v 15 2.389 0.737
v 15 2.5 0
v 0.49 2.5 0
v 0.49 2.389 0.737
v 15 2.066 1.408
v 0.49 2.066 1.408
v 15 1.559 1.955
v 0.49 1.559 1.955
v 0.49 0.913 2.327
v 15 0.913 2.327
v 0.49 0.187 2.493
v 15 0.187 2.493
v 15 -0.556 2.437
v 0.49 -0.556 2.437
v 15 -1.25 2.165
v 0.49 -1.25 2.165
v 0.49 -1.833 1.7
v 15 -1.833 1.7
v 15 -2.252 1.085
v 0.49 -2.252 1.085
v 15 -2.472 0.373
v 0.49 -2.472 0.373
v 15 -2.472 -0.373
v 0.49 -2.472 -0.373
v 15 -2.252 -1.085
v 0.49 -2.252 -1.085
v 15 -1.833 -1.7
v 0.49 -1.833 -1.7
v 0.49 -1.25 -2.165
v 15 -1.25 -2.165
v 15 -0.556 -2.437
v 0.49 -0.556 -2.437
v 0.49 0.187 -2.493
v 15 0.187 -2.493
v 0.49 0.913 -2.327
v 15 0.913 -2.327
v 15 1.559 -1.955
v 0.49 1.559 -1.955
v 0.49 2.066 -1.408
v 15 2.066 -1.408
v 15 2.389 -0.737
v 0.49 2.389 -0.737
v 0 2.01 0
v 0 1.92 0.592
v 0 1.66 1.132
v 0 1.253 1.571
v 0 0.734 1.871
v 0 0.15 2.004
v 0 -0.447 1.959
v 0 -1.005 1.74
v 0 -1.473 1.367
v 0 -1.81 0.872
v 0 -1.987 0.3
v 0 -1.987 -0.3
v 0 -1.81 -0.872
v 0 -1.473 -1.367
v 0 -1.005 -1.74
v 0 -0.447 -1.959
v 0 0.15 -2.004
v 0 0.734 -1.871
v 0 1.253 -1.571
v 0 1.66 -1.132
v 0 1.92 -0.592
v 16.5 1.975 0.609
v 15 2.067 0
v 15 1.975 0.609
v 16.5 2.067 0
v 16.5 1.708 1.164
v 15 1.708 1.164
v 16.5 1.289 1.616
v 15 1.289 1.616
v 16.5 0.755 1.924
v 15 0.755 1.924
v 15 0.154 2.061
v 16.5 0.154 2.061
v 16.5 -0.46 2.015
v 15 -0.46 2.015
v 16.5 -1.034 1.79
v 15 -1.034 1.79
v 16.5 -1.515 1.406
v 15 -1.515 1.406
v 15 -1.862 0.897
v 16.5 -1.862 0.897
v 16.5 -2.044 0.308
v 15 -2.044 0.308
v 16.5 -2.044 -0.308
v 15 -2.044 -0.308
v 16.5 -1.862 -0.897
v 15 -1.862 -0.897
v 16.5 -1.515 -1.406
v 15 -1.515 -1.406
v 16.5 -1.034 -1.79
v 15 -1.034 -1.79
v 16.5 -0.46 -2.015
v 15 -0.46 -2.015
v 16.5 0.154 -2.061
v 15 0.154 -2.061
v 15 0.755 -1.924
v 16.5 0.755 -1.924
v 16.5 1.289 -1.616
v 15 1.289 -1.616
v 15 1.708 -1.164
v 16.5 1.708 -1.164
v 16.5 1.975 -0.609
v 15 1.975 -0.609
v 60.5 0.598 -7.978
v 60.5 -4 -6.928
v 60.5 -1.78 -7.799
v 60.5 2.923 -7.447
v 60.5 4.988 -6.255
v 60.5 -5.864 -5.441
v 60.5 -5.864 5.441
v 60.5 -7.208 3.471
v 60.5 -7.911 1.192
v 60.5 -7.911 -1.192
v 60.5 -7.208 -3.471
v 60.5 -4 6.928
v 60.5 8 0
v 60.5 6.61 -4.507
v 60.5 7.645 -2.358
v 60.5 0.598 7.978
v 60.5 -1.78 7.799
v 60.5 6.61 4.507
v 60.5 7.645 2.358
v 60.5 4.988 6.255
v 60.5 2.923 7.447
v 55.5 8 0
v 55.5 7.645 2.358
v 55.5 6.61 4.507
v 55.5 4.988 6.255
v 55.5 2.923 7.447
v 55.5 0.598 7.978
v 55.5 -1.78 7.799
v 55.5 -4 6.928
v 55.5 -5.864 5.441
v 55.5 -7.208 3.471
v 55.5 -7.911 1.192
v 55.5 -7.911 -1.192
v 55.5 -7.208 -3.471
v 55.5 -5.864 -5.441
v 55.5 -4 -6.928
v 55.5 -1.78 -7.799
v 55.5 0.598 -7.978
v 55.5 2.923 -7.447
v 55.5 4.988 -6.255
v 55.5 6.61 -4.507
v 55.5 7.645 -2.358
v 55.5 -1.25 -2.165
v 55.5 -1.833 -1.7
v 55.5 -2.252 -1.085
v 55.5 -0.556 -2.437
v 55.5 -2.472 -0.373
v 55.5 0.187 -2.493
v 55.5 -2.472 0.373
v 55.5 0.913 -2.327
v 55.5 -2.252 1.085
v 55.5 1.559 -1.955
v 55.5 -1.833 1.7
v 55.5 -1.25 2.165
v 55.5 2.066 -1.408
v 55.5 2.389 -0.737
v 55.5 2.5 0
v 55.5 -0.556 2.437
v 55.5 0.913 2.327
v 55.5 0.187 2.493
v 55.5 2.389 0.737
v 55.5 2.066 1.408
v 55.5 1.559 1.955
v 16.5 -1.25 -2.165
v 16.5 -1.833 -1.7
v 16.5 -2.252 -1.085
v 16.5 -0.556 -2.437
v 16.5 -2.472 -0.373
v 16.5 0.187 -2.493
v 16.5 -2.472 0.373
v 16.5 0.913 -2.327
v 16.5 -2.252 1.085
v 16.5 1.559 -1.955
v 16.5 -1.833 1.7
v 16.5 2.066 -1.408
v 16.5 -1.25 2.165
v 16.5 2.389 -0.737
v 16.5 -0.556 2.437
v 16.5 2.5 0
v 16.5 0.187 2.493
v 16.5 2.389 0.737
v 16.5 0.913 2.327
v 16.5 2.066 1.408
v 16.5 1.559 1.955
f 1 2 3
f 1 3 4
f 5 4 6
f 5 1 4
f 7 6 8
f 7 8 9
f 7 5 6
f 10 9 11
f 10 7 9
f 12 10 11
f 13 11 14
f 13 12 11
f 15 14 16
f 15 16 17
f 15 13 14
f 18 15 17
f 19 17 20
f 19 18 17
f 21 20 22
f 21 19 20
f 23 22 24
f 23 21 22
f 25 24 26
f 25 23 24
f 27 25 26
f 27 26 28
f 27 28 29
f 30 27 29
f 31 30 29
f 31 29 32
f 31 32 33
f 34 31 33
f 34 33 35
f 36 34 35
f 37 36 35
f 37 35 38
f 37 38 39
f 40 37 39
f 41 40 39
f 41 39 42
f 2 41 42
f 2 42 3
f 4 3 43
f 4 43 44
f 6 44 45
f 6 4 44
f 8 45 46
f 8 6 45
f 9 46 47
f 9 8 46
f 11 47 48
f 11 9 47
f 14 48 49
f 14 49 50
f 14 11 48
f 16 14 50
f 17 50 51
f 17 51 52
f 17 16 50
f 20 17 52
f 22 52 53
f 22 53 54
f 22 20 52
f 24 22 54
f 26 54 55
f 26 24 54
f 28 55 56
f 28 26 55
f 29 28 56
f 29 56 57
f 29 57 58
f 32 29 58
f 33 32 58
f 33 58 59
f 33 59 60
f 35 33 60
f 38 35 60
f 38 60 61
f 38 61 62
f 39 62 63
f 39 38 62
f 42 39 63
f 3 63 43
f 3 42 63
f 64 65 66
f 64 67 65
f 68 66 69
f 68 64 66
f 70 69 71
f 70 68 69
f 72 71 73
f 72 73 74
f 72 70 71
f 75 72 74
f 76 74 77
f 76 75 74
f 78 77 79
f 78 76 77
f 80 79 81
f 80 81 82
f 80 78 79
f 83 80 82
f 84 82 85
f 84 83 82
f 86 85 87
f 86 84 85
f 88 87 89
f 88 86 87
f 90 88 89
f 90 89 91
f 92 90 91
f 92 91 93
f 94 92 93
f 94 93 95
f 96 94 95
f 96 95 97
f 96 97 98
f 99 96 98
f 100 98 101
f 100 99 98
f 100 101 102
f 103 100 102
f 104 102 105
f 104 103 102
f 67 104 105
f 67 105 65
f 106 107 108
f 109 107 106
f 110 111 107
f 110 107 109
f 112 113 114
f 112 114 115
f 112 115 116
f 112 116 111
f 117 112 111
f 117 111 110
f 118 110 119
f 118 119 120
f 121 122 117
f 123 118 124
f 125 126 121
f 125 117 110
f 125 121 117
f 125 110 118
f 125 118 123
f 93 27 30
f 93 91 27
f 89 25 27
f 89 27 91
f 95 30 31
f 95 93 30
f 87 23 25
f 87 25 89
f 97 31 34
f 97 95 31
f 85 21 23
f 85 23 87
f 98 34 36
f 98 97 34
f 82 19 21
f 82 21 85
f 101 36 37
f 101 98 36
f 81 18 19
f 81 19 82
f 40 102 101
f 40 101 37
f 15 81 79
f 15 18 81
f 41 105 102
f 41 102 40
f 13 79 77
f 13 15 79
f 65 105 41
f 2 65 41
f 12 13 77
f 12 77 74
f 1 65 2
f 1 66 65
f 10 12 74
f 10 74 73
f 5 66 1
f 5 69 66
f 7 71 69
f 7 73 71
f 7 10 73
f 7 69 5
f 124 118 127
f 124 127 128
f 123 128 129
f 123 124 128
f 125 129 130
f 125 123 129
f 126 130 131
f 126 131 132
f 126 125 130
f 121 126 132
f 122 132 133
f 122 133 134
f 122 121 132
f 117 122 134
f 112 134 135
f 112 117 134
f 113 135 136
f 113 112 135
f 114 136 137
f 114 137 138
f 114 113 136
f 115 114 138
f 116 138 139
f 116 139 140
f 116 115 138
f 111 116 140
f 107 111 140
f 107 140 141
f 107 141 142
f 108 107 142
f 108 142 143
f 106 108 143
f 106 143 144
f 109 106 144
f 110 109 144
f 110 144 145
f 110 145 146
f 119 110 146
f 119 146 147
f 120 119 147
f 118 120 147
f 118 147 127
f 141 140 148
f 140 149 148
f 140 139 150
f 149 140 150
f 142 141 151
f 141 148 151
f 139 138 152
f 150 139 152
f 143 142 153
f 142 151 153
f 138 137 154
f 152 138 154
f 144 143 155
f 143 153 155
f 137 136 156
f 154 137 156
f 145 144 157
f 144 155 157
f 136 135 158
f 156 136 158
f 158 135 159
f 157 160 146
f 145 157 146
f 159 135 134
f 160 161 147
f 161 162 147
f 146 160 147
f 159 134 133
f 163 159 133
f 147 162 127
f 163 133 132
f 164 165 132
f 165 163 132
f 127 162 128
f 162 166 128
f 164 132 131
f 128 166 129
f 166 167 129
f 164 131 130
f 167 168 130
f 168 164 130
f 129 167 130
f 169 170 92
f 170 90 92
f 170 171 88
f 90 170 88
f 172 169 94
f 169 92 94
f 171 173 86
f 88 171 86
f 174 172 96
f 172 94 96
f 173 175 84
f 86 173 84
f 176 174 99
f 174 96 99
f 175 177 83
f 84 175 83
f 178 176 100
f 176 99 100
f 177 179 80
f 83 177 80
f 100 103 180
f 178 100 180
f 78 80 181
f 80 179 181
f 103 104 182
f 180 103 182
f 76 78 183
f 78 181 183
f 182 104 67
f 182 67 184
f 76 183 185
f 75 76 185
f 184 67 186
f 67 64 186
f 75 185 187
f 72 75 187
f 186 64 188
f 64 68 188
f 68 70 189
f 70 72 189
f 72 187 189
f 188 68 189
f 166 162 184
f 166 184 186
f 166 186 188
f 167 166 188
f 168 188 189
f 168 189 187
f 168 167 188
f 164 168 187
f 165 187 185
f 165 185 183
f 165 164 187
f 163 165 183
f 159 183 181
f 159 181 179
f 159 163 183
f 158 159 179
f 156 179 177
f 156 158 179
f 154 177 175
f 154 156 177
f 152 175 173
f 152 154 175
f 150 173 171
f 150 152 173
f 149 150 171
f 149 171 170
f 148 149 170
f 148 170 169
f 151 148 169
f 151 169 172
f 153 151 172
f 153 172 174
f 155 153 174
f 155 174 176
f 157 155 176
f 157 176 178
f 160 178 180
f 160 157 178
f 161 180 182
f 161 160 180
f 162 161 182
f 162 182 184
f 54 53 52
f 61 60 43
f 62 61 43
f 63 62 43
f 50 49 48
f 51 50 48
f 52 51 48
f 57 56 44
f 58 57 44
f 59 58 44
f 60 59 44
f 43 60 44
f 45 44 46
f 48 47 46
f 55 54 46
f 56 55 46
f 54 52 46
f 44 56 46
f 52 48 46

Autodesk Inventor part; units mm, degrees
sketch "Sketch_5" plane through (0, 0, 0) normal (0, 0, 1) x (1, 0, 0)
  line L0 (60.5, 0) -> (0, 0)
  line L1 (0, 0) -> (0, 2.0095)
  line L2 (0, 2.0095) -> (0.4905, 2.5)
  line L3 (0.4905, 2.5) -> (15, 2.5)
  line L4 (15, 2.5) -> (15, 2.067)
  line L5 (15, 2.067) -> (16.5, 2.067)
  line L6 (16.5, 2.067) -> (16.5, 2.5)
  line L7 (16.5, 2.5) -> (55.5, 2.5)
  line L8 (55.5, 2.5) -> (55.5, 8)
  line L9 (55.5, 8) -> (60.5, 8)
  line L10 (60.5, 8) -> (60.5, 0)
  line L11 (60.5, 0) -> (0, 0)
revolve "Revolution1" add sketch "Sketch_5" angle 360 about axis through (60.5, 0, 0) along (1, 0, 0)
thread "Thread1" size "M5x0.8" class "6g" standard "ISO Metric profile" full length
ref_plane "ROD_BA_XY" through (10, 0, 0) normal (-1, 0, 0) x (0, 0, -1)
ref_plane "ROD_BA_YZ" through (10, 0, 0) normal (0, 0, -1) x (0, -1, 0)
ref_plane "ROD_BA_ZX" through (10, 0, 0) normal (0, -1, 0) x (-1, 0, 0)
ref_plane "ROD_BODY_XY" through (28, 0, 0) normal (1, 0, 0) x (0, 0, -1)
ref_plane "ROD_BODY_YZ" through (28, 0, 0) normal (0, 0, -1) x (0, 1, 0)
ref_plane "ROD_BODY_ZX" through (28, 0, 0) normal (0, 1, 0) x (1, 0, 0)
ref_plane "rodnt1_XY" through (7.5, 0, 0) normal (1, 0, 0) x (0, 0, -1)
ref_plane "rodnt1_YZ" through (7.5, 0, 0) normal (0, 0, -1) x (0, 1, 0)
ref_plane "rodnt1_ZX" through (7.5, 0, 0) normal (0, 1, 0) x (1, 0, 0)
properties part number "CJ2B16-15Z_ROD"
